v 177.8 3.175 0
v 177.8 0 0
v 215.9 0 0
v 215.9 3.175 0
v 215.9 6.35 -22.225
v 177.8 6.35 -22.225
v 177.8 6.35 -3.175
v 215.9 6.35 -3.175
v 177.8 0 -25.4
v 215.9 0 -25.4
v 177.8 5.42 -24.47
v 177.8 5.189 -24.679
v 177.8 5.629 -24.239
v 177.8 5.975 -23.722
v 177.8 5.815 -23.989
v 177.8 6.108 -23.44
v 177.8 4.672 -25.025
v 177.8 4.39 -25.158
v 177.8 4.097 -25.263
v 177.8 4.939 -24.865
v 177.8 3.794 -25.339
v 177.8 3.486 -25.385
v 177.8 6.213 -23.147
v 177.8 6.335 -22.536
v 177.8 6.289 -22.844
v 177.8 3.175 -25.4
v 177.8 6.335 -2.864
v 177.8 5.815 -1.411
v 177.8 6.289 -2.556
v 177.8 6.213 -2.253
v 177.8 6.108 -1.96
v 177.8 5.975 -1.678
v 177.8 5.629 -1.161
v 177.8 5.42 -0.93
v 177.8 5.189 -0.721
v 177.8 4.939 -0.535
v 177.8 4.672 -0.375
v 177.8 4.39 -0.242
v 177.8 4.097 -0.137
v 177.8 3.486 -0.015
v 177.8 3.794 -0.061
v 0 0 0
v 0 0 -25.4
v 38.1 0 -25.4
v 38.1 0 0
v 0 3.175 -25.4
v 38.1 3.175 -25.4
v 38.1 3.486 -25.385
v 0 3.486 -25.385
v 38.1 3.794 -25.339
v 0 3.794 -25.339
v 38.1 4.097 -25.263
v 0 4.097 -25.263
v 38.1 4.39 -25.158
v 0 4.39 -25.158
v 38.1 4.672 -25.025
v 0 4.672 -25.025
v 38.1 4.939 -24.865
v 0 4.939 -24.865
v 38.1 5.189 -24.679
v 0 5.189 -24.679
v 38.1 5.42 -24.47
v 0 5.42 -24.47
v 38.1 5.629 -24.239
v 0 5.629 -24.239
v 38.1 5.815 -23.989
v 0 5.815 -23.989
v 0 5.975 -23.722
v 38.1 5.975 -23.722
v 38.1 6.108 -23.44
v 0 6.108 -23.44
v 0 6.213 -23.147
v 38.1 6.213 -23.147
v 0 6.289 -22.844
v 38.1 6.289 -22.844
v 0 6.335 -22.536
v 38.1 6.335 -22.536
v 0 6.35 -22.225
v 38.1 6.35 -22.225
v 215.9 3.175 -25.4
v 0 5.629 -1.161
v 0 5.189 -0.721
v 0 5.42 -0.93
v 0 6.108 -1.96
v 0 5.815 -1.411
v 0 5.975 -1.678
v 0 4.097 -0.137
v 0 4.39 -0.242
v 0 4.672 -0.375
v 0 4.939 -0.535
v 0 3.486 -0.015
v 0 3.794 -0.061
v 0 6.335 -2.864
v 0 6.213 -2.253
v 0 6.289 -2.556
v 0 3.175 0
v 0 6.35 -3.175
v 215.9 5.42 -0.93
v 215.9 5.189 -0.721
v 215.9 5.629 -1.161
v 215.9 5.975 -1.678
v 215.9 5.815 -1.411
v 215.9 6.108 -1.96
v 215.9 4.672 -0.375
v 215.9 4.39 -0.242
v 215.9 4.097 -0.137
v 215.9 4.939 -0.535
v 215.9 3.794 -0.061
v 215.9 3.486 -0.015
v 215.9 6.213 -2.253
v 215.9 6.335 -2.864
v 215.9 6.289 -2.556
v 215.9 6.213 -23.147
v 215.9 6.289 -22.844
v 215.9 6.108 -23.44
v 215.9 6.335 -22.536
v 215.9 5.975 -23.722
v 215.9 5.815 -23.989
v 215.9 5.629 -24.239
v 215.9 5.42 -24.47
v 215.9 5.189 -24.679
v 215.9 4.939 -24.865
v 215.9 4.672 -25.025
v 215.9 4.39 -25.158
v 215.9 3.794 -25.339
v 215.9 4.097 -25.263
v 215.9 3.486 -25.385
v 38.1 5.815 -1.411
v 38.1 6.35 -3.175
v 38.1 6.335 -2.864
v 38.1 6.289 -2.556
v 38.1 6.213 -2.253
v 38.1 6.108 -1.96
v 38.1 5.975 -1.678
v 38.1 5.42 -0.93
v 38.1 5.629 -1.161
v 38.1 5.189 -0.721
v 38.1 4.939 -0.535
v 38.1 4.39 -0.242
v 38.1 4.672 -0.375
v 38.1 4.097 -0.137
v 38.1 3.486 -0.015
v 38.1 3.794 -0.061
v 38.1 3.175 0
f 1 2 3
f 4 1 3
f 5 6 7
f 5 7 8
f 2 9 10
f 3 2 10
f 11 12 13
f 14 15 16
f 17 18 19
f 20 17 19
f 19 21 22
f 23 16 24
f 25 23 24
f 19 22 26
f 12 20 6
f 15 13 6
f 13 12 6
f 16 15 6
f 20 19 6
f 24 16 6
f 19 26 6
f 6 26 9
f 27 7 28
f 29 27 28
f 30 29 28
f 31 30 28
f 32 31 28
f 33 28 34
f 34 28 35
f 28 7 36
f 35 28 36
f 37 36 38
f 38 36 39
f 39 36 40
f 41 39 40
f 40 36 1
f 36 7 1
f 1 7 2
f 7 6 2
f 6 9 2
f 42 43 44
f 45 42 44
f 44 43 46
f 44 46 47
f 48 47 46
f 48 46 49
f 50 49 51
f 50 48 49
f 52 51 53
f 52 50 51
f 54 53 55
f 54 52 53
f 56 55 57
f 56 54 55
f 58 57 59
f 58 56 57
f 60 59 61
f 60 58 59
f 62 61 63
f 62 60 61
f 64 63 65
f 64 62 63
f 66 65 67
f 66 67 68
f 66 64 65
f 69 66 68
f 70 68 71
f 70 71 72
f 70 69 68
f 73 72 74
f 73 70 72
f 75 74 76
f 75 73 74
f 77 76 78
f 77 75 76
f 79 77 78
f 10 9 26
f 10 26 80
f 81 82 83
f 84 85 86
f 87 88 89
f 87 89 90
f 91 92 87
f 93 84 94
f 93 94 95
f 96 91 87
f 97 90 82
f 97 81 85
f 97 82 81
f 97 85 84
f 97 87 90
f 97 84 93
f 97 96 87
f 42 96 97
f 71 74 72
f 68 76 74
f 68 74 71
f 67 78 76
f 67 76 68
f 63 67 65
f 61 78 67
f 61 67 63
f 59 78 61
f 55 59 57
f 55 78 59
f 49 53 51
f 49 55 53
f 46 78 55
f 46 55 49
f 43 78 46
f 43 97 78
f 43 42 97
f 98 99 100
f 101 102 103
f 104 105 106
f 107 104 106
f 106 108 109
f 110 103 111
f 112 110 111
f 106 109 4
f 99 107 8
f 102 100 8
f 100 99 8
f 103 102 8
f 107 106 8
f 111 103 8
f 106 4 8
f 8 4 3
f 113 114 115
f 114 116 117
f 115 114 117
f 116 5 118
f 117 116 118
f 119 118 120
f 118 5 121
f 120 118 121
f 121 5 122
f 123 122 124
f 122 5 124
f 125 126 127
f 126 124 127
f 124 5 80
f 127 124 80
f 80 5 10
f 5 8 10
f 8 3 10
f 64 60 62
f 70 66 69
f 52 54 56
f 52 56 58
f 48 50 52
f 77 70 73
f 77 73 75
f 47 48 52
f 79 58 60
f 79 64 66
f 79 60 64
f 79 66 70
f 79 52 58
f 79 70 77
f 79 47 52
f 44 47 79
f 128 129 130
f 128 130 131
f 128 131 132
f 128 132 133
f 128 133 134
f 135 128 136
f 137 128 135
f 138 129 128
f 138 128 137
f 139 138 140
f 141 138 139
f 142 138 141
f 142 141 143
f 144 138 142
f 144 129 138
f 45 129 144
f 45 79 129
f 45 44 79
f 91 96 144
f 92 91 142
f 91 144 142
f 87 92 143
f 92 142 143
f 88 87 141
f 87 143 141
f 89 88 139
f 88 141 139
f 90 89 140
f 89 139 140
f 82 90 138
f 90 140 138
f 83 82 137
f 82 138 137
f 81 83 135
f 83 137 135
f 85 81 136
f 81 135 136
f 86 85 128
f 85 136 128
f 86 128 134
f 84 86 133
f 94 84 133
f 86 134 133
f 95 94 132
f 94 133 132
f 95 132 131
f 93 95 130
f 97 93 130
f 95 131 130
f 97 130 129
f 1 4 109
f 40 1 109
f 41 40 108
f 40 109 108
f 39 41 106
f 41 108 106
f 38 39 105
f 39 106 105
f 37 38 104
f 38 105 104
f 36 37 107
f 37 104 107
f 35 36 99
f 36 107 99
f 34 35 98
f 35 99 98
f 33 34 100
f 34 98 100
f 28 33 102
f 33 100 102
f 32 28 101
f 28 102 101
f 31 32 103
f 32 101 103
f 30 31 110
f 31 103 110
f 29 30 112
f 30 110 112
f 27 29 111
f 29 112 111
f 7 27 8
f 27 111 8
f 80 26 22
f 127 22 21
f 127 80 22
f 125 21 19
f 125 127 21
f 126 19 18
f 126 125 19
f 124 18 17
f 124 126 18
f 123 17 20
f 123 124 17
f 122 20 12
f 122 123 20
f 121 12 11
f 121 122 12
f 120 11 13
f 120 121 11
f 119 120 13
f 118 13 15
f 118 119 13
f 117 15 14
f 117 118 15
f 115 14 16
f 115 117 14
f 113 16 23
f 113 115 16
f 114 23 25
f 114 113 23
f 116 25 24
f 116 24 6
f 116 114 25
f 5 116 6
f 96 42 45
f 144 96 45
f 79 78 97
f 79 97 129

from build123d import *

# Parameters (mm, degrees)
SKETCH1_W           = 215.9
SKETCH1_H           = 25.4
BOSS_EXTRUDE1_DEPTH = 6.35
FILLET1_R           = 3.175
SKETCH2_W           = 139.7
SKETCH2_H           = 25.4
CUT_EXTRUDE1_DEPTH  = 7.35


with BuildPart() as part:
    # Sketch1 → Boss-Extrude1 (new body)
    with BuildSketch(Plane(origin=(0, 0, 0), x_dir=(1, 0, 0), z_dir=(0, 1, 0))):
        with Locations((107.95, 12.7)):
            Rectangle(SKETCH1_W, SKETCH1_H)
    extrude(amount=BOSS_EXTRUDE1_DEPTH)

    # Fillet1
    fillet1_edges = [part.edges().sort_by_distance(p)[0] for p in [
        (107.95, 6.35, -25.4),
        (107.95, 6.35, 0),
    ]]
    fillet(fillet1_edges, radius=FILLET1_R)

    # Sketch2 → Cut-Extrude1 (cut, through all)
    with BuildSketch(Plane.XZ):
        with Locations((107.95, -12.7)):
            Rectangle(SKETCH2_W, SKETCH2_H)
    extrude(amount=-CUT_EXTRUDE1_DEPTH, mode=Mode.SUBTRACT)


solid = part.part
